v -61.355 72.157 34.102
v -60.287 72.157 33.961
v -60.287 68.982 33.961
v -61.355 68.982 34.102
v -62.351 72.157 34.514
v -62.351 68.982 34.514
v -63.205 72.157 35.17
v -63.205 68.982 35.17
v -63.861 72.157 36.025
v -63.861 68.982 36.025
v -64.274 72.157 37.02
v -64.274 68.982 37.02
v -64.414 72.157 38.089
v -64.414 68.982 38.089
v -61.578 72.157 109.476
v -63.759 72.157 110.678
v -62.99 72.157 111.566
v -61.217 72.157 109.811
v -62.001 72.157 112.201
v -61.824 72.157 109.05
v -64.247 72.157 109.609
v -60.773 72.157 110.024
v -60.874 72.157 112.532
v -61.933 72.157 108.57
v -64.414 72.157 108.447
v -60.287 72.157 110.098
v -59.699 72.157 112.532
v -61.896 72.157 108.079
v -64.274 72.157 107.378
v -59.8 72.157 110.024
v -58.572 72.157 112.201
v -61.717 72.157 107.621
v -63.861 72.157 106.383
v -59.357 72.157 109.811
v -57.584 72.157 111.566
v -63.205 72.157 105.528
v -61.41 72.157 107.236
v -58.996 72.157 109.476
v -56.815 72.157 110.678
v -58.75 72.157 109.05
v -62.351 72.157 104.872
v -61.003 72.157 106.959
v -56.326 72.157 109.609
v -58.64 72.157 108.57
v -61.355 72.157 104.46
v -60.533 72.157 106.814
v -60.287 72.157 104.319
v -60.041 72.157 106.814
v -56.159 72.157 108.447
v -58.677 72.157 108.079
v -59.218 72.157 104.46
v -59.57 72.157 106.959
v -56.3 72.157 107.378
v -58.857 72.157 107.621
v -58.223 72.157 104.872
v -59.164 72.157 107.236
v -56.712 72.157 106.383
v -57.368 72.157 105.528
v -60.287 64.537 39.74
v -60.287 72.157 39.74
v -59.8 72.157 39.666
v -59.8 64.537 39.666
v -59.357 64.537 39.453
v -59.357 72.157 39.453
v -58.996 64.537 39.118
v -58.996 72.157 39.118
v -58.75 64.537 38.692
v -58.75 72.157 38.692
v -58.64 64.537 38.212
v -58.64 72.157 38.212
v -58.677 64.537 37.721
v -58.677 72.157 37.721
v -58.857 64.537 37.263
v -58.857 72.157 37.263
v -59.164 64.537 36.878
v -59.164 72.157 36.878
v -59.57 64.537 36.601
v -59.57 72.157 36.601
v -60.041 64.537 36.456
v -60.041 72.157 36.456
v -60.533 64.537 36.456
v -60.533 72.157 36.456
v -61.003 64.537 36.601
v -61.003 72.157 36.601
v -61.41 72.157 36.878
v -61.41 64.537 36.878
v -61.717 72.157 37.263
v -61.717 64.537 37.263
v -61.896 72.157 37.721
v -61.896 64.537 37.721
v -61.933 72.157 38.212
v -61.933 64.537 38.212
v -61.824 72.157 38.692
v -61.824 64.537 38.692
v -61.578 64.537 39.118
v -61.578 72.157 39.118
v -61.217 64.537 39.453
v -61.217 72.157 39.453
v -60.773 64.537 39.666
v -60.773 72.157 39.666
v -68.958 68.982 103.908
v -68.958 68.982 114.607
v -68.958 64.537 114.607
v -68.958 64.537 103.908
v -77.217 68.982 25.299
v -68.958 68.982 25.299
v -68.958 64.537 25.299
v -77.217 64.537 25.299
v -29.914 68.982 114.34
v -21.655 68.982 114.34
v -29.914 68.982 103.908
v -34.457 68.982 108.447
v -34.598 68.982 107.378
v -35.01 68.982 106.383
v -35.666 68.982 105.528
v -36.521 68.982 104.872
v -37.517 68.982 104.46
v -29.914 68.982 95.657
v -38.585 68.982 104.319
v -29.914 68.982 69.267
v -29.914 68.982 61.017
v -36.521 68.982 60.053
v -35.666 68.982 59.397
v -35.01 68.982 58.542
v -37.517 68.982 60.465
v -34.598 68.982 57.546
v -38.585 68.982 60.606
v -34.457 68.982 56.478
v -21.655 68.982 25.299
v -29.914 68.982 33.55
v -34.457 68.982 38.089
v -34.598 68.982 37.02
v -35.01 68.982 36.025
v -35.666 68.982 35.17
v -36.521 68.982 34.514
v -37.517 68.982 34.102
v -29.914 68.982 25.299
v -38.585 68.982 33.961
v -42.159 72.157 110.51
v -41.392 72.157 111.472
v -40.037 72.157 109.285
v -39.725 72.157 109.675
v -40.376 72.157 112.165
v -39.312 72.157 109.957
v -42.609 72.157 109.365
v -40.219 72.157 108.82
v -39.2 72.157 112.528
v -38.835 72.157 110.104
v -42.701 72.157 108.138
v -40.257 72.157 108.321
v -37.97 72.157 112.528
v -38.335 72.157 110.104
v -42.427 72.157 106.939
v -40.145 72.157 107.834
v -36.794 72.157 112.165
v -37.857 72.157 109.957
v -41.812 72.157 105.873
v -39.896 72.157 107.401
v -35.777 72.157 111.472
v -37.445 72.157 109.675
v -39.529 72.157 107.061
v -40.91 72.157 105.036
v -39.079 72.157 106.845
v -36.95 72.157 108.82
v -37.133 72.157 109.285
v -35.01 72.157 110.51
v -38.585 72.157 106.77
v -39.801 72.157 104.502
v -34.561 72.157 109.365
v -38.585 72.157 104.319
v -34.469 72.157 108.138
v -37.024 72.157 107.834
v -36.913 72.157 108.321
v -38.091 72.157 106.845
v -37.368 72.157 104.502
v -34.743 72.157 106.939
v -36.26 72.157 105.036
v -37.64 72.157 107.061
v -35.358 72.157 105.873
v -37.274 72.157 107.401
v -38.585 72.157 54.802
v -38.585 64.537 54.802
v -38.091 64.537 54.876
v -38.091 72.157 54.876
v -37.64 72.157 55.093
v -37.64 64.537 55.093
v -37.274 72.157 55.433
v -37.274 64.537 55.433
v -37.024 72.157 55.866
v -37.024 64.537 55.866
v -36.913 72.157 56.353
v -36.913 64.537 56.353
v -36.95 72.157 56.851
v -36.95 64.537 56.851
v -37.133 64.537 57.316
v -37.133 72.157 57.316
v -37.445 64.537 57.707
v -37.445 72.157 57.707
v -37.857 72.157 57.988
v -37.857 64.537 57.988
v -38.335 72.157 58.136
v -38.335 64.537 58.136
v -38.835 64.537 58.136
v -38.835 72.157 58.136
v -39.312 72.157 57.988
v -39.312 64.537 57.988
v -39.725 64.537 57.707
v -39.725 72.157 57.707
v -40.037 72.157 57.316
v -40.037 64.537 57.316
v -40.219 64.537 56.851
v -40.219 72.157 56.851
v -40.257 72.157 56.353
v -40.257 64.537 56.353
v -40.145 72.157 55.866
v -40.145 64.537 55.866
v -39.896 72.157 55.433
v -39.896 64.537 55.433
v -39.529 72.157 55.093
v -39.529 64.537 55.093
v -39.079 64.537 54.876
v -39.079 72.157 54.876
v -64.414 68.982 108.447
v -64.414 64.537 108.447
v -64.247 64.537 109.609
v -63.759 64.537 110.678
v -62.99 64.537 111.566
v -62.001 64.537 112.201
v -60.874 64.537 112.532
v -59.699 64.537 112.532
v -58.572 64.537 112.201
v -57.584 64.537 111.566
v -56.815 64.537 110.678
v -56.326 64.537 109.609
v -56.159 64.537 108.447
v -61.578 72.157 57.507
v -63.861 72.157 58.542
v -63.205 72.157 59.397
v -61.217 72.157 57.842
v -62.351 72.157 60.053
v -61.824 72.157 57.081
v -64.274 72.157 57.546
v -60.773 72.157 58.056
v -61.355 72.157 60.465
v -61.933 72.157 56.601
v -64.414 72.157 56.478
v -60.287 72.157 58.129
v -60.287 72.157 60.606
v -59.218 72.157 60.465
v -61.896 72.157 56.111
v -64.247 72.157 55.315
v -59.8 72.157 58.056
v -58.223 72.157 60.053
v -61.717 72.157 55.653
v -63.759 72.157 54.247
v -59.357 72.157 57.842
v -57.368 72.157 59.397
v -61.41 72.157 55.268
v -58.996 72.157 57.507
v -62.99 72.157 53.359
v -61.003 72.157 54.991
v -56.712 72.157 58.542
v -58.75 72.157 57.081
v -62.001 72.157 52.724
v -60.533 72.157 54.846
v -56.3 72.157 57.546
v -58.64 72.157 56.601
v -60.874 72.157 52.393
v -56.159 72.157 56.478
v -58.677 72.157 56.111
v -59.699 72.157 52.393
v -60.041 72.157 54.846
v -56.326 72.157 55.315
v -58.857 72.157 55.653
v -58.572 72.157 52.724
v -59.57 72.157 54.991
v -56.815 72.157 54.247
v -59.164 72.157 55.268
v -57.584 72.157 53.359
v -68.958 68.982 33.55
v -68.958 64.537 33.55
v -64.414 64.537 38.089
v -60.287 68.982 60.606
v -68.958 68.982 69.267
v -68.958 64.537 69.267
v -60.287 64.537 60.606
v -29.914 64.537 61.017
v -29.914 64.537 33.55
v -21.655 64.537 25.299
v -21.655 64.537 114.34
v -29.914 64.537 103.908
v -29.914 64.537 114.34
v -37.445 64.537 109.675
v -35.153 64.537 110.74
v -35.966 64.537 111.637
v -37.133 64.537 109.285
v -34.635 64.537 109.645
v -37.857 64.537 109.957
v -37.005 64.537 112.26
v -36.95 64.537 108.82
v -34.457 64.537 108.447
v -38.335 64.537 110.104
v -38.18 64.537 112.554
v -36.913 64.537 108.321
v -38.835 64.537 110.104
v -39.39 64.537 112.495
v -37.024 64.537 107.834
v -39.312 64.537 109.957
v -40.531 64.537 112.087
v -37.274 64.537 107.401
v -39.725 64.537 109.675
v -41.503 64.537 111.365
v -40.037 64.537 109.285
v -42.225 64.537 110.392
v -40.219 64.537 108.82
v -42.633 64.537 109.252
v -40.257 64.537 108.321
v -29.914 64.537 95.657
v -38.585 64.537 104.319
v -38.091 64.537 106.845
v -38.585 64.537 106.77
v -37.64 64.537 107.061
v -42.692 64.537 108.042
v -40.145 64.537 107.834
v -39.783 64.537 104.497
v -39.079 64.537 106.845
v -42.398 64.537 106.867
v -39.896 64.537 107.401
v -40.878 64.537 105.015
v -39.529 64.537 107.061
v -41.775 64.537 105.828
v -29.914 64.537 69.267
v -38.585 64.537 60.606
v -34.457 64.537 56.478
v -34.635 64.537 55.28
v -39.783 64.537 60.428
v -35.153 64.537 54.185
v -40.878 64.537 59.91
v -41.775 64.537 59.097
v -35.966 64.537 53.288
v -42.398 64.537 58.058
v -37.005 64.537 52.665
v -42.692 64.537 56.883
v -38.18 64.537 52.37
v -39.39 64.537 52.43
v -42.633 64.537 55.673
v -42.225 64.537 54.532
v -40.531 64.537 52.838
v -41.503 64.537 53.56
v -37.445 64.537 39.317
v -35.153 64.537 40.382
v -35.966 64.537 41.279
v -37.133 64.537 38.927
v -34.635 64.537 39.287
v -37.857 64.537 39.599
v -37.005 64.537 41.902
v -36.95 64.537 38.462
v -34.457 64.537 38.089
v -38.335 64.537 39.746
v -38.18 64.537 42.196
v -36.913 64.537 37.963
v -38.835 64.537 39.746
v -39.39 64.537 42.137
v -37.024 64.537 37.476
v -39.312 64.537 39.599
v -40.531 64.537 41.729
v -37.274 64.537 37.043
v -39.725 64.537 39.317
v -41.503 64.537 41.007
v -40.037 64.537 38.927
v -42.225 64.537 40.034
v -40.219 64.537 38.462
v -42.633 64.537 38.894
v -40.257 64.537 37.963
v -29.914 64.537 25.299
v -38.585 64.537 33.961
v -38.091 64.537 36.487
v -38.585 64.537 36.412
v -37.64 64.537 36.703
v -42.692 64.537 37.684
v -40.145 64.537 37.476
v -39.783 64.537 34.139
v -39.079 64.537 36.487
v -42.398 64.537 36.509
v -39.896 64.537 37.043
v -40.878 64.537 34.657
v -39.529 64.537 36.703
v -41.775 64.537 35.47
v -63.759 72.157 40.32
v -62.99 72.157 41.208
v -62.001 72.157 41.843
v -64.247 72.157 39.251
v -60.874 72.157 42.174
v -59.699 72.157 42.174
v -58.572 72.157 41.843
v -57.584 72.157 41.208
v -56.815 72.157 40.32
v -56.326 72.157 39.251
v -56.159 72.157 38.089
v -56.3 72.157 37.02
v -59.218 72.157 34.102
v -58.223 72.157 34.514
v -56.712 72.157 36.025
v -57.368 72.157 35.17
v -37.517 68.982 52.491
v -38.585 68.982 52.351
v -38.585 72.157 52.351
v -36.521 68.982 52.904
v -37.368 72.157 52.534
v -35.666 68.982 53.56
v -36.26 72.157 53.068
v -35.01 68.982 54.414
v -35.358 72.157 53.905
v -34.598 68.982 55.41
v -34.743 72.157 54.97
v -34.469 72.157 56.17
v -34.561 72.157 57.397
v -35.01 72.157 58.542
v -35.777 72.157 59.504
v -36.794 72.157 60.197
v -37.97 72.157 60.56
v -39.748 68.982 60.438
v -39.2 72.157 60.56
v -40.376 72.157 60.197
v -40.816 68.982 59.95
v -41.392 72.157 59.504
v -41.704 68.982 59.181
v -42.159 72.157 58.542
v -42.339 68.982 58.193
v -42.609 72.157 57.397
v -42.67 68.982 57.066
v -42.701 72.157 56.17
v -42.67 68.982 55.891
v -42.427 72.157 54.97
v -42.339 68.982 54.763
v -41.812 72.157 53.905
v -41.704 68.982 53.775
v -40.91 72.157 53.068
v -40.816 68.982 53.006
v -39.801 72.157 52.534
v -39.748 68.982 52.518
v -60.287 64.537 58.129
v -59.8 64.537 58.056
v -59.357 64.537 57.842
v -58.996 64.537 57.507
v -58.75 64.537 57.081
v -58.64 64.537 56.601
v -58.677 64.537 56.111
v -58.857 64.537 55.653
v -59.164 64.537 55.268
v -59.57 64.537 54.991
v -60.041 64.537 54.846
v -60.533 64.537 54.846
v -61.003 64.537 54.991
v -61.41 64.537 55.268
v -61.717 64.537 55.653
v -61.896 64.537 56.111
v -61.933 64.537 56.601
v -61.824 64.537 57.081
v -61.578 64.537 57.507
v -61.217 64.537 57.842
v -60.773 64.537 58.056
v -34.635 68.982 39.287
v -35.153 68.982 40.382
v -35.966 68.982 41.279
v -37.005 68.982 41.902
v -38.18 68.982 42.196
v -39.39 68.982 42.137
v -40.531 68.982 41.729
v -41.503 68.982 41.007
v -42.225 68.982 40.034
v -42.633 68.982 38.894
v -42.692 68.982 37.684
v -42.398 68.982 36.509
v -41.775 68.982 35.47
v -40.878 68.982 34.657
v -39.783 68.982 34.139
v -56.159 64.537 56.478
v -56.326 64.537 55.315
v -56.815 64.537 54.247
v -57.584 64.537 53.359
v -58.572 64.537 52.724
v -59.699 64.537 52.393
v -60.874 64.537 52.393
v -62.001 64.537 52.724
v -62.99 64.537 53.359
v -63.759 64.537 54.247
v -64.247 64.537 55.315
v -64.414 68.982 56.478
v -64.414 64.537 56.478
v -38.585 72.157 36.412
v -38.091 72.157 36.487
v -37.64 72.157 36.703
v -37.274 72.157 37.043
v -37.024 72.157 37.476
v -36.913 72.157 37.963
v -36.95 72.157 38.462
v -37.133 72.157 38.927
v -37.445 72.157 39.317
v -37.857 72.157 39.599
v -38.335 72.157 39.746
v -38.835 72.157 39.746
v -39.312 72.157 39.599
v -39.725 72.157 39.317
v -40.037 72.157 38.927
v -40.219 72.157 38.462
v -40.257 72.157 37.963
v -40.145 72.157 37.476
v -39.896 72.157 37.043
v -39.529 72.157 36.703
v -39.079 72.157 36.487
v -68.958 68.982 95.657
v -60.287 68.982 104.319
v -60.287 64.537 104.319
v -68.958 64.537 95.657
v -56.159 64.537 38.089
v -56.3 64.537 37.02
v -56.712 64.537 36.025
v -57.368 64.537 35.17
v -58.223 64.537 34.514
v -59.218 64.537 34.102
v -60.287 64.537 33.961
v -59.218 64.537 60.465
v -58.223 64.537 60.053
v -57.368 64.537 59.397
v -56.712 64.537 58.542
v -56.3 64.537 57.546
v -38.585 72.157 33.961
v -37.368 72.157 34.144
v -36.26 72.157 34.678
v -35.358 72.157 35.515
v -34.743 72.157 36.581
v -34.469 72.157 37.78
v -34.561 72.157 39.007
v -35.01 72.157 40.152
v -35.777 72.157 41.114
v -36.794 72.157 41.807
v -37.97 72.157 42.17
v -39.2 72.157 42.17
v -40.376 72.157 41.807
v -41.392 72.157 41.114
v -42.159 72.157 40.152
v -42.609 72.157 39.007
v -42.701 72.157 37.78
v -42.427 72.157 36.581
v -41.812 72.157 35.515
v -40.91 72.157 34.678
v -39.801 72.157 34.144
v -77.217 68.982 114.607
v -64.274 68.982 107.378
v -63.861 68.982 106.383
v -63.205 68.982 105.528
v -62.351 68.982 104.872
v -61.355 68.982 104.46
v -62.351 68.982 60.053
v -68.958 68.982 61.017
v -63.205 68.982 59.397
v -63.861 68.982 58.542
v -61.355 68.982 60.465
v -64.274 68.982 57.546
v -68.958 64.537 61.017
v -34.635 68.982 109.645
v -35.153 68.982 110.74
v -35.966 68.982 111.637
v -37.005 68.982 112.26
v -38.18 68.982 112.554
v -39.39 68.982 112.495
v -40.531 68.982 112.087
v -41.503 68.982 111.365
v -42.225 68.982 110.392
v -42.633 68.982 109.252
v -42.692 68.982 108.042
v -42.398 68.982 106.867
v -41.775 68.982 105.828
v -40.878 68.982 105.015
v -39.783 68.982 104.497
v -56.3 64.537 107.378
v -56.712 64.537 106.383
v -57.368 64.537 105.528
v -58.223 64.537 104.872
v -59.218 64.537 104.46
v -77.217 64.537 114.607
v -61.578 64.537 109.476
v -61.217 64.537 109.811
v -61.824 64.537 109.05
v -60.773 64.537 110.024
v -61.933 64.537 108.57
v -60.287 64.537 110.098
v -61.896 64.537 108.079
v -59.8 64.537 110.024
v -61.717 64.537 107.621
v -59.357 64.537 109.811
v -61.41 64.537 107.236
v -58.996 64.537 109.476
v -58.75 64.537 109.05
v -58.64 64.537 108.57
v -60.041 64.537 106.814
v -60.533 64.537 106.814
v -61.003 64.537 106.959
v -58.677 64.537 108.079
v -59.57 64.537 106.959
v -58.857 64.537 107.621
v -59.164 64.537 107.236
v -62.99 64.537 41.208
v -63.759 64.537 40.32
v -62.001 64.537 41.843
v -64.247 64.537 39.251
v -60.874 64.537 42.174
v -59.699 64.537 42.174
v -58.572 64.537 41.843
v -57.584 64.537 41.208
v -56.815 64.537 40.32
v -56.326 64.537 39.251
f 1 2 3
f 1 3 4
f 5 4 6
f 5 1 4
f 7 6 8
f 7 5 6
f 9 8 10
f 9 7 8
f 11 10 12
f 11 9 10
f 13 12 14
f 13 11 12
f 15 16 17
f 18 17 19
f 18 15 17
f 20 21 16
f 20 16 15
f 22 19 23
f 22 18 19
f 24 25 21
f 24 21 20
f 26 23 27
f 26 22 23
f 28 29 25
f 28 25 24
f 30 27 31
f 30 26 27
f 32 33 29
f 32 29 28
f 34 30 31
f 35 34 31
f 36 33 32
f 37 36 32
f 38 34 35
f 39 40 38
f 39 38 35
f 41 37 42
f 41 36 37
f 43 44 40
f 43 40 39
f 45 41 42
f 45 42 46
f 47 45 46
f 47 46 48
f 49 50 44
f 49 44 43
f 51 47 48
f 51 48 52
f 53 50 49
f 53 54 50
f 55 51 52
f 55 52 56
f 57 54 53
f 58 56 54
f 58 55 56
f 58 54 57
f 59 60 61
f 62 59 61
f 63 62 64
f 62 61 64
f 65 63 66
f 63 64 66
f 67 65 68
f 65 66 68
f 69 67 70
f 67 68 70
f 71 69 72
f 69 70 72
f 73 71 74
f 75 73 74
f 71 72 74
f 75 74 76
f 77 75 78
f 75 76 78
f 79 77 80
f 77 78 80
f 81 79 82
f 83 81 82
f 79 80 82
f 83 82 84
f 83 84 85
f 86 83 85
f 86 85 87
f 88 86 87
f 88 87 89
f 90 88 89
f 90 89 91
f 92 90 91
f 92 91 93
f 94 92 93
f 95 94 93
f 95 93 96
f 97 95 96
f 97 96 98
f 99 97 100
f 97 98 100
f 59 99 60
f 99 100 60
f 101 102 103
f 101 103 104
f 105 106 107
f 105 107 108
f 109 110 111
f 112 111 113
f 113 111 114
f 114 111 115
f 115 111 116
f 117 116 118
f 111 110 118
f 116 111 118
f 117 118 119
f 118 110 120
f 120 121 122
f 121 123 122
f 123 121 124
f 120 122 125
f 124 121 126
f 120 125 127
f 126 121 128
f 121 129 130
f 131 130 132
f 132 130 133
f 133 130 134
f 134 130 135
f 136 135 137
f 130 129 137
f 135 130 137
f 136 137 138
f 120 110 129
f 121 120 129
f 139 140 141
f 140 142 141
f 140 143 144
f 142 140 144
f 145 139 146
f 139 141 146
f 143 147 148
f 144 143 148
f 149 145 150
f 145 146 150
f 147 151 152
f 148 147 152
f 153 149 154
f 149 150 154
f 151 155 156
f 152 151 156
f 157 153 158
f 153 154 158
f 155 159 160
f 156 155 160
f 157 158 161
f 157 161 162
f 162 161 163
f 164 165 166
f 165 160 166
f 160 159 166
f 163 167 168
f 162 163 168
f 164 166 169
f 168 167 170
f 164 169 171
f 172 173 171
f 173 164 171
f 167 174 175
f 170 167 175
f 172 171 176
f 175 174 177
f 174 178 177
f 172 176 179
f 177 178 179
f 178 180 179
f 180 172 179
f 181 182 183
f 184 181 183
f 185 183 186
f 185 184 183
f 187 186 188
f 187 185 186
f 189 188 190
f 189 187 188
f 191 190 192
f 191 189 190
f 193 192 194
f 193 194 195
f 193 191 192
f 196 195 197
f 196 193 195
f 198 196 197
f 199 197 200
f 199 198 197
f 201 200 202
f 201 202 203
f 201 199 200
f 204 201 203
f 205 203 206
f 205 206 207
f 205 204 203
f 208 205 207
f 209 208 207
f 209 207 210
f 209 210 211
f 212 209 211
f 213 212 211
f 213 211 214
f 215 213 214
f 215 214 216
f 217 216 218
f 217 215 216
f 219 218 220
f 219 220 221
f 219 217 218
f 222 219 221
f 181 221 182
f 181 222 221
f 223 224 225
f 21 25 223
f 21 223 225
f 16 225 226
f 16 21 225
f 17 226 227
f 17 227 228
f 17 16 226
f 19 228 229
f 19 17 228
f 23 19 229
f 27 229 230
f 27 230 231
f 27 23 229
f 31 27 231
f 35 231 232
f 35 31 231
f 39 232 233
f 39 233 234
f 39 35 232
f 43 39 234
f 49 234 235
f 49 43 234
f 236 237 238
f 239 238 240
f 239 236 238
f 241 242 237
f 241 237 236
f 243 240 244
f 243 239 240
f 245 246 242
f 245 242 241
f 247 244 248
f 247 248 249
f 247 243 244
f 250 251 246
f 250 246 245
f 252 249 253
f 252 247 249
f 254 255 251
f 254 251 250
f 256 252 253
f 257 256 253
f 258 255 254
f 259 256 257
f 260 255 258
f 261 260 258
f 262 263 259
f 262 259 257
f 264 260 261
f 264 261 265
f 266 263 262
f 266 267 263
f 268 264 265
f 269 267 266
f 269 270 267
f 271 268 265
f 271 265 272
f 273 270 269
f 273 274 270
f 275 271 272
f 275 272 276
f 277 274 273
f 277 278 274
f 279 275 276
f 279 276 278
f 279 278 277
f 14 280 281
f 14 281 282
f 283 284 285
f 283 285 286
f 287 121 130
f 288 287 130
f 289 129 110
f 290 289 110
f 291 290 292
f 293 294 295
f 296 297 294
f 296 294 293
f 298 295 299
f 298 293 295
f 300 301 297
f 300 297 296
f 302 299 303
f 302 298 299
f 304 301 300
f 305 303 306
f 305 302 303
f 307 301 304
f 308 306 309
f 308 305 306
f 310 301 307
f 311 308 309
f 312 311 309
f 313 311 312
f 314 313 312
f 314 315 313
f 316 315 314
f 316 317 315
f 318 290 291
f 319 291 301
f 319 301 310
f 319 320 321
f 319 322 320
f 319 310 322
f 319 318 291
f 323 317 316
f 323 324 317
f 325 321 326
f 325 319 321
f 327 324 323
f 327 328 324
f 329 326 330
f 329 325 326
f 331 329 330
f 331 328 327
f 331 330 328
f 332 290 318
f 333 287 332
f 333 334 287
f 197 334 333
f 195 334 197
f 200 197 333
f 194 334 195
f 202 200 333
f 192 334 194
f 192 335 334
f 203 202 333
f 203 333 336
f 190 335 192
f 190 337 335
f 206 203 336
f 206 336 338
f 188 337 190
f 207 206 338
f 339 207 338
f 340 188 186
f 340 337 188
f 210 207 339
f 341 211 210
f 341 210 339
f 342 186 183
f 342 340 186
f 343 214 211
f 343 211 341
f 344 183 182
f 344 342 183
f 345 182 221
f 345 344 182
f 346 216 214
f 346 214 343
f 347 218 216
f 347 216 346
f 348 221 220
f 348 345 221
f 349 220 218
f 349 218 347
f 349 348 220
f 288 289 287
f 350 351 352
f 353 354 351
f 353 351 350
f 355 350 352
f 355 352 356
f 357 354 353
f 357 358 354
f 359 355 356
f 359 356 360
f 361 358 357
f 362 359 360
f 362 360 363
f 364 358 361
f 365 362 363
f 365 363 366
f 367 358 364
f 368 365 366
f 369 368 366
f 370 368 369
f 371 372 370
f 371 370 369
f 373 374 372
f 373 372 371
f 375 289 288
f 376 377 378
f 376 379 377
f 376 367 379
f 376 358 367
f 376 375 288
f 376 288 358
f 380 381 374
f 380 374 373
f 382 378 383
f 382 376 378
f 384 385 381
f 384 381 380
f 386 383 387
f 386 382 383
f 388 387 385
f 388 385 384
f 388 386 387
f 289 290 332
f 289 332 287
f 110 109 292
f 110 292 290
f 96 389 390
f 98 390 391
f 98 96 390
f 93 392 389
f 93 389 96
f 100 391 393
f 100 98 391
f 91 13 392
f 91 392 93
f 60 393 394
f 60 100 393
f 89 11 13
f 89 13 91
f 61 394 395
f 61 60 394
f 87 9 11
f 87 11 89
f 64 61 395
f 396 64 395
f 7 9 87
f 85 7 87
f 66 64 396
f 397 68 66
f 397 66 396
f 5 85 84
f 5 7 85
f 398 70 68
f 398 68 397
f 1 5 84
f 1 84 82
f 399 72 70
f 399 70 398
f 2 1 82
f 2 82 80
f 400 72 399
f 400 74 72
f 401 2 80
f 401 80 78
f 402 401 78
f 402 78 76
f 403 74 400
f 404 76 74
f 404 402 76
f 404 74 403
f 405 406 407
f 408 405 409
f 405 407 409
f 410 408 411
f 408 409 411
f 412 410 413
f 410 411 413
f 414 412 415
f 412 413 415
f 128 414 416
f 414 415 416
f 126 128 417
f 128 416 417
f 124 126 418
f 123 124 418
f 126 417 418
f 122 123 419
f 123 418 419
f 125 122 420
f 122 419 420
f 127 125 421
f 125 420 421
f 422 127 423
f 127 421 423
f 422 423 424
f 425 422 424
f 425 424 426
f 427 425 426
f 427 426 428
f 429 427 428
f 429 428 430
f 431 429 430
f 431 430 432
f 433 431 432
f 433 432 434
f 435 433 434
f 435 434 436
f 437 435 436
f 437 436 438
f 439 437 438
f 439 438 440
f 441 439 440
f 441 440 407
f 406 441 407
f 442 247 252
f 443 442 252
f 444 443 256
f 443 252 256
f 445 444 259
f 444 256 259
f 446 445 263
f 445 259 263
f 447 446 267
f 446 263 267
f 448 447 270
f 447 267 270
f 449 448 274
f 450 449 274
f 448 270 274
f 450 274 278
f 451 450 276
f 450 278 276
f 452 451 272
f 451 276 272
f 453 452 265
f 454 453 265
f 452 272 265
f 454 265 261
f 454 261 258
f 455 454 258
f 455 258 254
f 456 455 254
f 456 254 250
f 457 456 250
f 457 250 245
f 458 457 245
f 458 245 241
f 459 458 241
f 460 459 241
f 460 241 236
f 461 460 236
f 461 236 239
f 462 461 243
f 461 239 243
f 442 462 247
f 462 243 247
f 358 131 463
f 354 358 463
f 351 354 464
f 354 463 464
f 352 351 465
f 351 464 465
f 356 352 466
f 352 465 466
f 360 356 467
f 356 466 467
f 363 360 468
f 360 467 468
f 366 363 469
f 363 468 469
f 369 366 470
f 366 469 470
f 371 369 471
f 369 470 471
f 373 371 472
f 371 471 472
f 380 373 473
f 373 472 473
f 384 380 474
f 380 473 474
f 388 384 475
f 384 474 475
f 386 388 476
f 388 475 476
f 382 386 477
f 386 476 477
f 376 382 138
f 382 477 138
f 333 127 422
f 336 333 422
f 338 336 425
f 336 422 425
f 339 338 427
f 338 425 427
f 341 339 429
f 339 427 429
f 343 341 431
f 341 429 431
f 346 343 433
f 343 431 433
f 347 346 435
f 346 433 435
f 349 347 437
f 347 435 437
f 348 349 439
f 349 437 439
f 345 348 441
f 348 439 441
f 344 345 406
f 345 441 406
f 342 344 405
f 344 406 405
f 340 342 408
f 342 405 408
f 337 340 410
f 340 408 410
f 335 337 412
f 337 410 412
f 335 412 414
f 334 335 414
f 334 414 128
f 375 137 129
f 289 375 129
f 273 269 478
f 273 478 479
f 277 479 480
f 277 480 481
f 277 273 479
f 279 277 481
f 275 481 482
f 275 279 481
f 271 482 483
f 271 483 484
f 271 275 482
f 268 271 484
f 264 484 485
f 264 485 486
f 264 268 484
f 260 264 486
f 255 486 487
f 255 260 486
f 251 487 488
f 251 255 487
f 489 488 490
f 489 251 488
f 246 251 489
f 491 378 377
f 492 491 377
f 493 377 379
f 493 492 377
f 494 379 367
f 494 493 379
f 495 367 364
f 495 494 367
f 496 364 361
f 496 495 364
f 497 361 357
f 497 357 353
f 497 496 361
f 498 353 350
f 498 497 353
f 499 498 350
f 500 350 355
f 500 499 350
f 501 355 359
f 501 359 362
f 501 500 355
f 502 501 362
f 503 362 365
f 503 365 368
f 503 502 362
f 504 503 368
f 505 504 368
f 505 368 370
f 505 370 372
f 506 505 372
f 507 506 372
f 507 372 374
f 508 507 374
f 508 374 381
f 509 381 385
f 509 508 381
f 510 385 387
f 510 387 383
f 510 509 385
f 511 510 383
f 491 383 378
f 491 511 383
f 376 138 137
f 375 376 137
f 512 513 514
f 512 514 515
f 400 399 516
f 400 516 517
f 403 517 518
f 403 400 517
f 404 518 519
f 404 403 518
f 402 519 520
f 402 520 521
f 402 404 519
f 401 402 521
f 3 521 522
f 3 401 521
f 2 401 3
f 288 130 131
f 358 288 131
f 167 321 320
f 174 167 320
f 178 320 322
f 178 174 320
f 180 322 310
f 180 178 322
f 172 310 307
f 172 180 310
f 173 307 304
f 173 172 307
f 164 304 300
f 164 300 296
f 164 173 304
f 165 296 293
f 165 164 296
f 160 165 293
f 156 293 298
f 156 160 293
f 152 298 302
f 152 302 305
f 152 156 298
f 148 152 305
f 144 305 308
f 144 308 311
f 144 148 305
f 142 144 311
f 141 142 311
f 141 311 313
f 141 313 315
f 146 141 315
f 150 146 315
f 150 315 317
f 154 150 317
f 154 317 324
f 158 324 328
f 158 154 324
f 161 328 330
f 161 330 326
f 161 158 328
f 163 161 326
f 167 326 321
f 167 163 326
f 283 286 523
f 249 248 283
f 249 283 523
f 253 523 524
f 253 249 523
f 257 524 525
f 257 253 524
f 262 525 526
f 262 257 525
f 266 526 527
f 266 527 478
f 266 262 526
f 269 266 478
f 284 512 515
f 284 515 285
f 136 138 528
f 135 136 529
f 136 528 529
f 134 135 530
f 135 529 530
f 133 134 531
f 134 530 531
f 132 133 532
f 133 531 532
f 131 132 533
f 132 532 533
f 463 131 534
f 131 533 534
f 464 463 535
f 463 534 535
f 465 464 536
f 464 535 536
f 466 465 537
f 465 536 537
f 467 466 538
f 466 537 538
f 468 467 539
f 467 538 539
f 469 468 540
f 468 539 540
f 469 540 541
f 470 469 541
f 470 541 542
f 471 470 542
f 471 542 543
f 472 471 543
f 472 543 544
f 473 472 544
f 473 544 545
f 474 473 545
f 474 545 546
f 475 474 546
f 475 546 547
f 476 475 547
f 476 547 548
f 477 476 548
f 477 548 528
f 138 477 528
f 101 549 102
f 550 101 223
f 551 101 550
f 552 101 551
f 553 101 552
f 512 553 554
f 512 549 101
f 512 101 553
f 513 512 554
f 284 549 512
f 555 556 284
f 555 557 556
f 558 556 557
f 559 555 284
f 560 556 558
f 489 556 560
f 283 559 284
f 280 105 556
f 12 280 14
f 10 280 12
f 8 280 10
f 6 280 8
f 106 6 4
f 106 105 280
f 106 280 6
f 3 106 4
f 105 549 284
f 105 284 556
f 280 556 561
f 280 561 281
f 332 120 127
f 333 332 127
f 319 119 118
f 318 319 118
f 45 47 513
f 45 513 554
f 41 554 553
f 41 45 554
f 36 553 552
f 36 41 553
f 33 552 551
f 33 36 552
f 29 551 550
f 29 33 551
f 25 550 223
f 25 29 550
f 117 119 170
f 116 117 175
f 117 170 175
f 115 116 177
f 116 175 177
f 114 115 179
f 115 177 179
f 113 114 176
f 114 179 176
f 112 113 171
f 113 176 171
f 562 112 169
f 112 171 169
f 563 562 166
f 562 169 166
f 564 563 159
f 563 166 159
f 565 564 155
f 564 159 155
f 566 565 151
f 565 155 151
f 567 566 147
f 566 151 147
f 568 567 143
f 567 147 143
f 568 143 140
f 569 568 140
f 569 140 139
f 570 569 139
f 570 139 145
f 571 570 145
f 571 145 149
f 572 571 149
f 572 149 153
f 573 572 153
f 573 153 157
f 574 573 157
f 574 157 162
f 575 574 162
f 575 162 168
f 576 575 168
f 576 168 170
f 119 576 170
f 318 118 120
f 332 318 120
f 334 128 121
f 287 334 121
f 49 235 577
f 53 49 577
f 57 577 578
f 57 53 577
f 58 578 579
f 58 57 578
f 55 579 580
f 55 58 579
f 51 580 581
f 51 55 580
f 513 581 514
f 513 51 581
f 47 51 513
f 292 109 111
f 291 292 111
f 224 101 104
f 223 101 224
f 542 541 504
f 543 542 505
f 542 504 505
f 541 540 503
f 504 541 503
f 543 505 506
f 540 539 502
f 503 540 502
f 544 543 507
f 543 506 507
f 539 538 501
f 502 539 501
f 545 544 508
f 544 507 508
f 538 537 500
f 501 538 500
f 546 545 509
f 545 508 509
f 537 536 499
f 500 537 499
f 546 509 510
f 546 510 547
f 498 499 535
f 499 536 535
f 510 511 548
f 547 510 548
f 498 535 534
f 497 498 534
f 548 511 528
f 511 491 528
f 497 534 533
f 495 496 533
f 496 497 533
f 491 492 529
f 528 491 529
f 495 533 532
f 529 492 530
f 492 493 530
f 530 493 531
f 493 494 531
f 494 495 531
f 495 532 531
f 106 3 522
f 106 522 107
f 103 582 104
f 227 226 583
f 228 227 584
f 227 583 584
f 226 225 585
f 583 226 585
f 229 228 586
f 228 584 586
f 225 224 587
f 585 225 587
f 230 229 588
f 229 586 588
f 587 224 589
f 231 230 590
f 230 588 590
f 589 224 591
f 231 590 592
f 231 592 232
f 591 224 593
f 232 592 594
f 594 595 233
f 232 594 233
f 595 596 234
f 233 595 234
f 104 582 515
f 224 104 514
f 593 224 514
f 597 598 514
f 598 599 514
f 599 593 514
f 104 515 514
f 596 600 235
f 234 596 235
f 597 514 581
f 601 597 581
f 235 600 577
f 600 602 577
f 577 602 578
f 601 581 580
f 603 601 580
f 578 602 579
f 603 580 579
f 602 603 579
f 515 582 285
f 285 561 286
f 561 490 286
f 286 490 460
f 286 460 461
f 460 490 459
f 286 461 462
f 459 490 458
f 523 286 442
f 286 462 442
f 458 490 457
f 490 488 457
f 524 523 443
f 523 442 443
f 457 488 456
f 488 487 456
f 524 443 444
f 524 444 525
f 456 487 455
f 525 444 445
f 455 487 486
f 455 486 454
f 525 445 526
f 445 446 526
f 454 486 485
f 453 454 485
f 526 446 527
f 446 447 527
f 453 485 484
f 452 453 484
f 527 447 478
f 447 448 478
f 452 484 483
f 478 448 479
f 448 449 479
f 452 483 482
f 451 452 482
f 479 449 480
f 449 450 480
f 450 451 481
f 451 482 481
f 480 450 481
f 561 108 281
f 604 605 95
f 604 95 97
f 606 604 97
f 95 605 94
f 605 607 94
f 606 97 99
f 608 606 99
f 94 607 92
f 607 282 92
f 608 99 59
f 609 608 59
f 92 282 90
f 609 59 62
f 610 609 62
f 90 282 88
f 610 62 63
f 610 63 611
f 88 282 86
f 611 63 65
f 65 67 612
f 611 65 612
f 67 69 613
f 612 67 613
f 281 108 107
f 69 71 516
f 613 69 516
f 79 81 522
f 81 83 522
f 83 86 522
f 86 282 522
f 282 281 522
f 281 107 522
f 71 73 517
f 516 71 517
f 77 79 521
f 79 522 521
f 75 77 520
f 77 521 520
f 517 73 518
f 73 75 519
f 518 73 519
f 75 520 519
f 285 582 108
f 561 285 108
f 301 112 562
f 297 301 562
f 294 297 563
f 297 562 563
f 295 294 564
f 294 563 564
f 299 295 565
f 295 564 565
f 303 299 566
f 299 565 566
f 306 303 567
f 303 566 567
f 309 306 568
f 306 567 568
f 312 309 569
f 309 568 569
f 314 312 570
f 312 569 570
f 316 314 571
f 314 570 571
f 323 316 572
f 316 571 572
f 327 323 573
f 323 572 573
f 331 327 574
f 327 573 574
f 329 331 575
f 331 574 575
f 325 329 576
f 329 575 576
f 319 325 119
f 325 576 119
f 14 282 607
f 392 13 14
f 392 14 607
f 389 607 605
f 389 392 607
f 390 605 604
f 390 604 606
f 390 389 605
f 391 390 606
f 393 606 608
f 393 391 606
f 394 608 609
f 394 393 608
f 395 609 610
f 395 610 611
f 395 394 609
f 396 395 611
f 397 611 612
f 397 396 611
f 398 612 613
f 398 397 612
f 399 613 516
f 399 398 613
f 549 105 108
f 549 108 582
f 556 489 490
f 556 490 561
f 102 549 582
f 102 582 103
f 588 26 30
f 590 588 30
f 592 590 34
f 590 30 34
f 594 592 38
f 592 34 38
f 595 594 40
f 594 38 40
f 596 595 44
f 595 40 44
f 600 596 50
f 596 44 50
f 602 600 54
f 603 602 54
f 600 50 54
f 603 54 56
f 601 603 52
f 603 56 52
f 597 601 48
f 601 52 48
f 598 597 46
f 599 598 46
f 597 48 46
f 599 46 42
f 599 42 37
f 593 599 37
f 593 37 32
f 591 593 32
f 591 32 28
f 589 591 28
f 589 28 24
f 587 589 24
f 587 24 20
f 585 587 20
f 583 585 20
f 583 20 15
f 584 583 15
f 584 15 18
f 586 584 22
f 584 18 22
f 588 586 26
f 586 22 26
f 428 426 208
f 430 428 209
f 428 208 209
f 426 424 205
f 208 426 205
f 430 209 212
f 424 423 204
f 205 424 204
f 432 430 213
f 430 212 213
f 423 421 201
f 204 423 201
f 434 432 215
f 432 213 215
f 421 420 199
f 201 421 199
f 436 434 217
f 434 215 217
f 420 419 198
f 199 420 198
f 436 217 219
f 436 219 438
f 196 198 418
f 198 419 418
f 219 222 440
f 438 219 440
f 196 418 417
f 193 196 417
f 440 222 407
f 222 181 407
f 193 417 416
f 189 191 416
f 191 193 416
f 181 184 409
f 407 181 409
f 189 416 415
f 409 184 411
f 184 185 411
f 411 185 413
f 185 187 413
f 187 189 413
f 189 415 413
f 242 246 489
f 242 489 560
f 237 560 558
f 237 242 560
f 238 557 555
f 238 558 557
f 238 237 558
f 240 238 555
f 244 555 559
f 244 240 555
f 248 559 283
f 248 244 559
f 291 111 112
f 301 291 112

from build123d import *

# Parameters (mm, degrees)
SKETCH1_R              = 4.1275
SKETCH1_R_2            = 1.6764
BOSS_EXTRUDE1_DEPTH    = 3.175
BOSS_EXTRUDE1_2_DEPTH  = 3.175
BOSS_EXTRUDE1_3_DEPTH  = 3.175
BOSS_EXTRUDE1_4_DEPTH  = 3.175
BOSS_EXTRUDE1_5_DEPTH  = 3.175
BOSS_EXTRUDE1_6_DEPTH  = 3.175
BOSS_EXTRUDE1_7_DEPTH  = 3.175
BOSS_EXTRUDE1_8_DEPTH  = 3.175
BOSS_EXTRUDE1_9_DEPTH  = 3.175
BOSS_EXTRUDE1_10_DEPTH = 3.175
BOSS_EXTRUDE1_11_DEPTH = 3.175
BOSS_EXTRUDE1_12_DEPTH = 3.175
SKETCH2_R              = 1.6764
SKETCH2_R_2            = 1.597419346
BOSS_EXTRUDE2_DEPTH    = 4.445
SKETCH3_R              = 4.1275
SKETCH3_R_2            = 1.6764
BOSS_EXTRUDE3_DEPTH    = 6.35
SKETCH5_W              = 93.927077551
SKETCH5_H              = 52.017280011
CUT_EXTRUDE1_DEPTH     = 189.093566893
SKETCH6_W              = 99.512687727
SKETCH6_H              = 74.862867045
CUT_EXTRUDE3_DEPTH     = 189.006725097
SKETCH7_R              = 1.651
BOSS_EXTRUDE5_DEPTH    = 7.62
BOSS_EXTRUDE5_2_DEPTH  = 7.62
BOSS_EXTRUDE5_3_DEPTH  = 7.62
BOSS_EXTRUDE6_DEPTH    = 4.445
SKETCH10_W             = 53.220622609
SKETCH10_H             = 98.471007051
CUT_EXTRUDE4_DEPTH     = 139.402426653


with BuildPart() as part:
    # Sketch1 → Boss-Extrude1 (new body)
    with BuildSketch(Plane(origin=(0, 72.156669294, 0), x_dir=(-1, 0, 0), z_dir=(0, -1, 0))):
        with Locations(Location((-13.434351276, 13.879892008, 0), (0, 0, 90))):
            Circle(SKETCH1_R)
        with Locations(Location((-13.434351276, 13.879892008, 0), (0, 0, 90))):
            Circle(SKETCH1_R_2, mode=Mode.SUBTRACT)
    extrude(amount=BOSS_EXTRUDE1_DEPTH)



with BuildPart() as body_2:
    # Sketch1 → Boss-Extrude1 2 (new body)
    with BuildSketch(Plane(origin=(0, 72.156669294, 0), x_dir=(-1, 0, 0), z_dir=(0, -1, 0))):
        with Locations(Location((38.584848724, 13.879892008, 0), (0, 0, 90))):
            Circle(SKETCH1_R)
        with Locations(Location((38.584848724, 13.879892008, 0), (0, 0, 90))):
            Circle(SKETCH1_R_2, mode=Mode.SUBTRACT)
    extrude(amount=BOSS_EXTRUDE1_2_DEPTH)



with BuildPart() as body_3:
    # Sketch1 → Boss-Extrude1 3 (new body)
    with BuildSketch(Plane(origin=(0, 72.156669294, 0), x_dir=(-1, 0, 0), z_dir=(0, -1, 0))):
        with Locations(Location((-13.434351276, -38.088507992, 0), (0, 0, 90))):
            Circle(SKETCH1_R)
        with Locations(Location((-13.434351276, -38.088507992, 0), (0, 0, 90))):
            Circle(SKETCH1_R_2, mode=Mode.SUBTRACT)
    extrude(amount=BOSS_EXTRUDE1_3_DEPTH)


with BuildPart() as body_4:
    # Sketch1 → Boss-Extrude1 4 (new body)
    with BuildSketch(Plane(origin=(0, 72.156669294, 0), x_dir=(-1, 0, 0), z_dir=(0, -1, 0))):
        with Locations(Location((38.584848724, -38.088507992, 0), (0, 0, 90))):
            Circle(SKETCH1_R)
        with Locations(Location((38.584848724, -38.088507992, 0), (0, 0, 90))):
            Circle(SKETCH1_R_2, mode=Mode.SUBTRACT)
    extrude(amount=BOSS_EXTRUDE1_4_DEPTH)


with BuildPart() as body_5:
    # Sketch1 → Boss-Extrude1 5 (new body)
    with BuildSketch(Plane(origin=(0, 72.156669294, 0), x_dir=(-1, 0, 0), z_dir=(0, -1, 0))):
        with Locations(Location((-13.434351276, -56.478107992, 0), (0, 0, 90))):
            Circle(SKETCH1_R)
        with Locations(Location((-13.434351276, -56.478107992, 0), (0, 0, 90))):
            Circle(SKETCH1_R_2, mode=Mode.SUBTRACT)
    extrude(amount=BOSS_EXTRUDE1_5_DEPTH)


with BuildPart() as body_6:
    # Sketch1 → Boss-Extrude1 6 (new body)
    with BuildSketch(Plane(origin=(0, 72.156669294, 0), x_dir=(-1, 0, 0), z_dir=(0, -1, 0))):
        with Locations(Location((38.584848724, -56.478107992, 0), (0, 0, 90))):
            Circle(SKETCH1_R)
        with Locations(Location((38.584848724, -56.478107992, 0), (0, 0, 90))):
            Circle(SKETCH1_R_2, mode=Mode.SUBTRACT)
    extrude(amount=BOSS_EXTRUDE1_6_DEPTH)


with BuildPart() as body_7:
    # Sketch1 → Boss-Extrude1 7 (new body)
    with BuildSketch(Plane(origin=(0, 72.156669294, 0), x_dir=(-1, 0, 0), z_dir=(0, -1, 0))):
        with Locations(Location((-13.434351276, -108.446507992, 0), (0, 0, 90))):
            Circle(SKETCH1_R)
        with Locations(Location((-13.434351276, -108.446507992, 0), (0, 0, 90))):
            Circle(SKETCH1_R_2, mode=Mode.SUBTRACT)
    extrude(amount=BOSS_EXTRUDE1_7_DEPTH)


with BuildPart() as body_8:
    # Sketch1 → Boss-Extrude1 8 (new body)
    with BuildSketch(Plane(origin=(0, 72.156669294, 0), x_dir=(-1, 0, 0), z_dir=(0, -1, 0))):
        with Locations(Location((38.584848724, -108.446507992, 0), (0, 0, 90))):
            Circle(SKETCH1_R)
        with Locations(Location((38.584848724, -108.446507992, 0), (0, 0, 90))):
            Circle(SKETCH1_R_2, mode=Mode.SUBTRACT)
    extrude(amount=BOSS_EXTRUDE1_8_DEPTH)


with BuildPart() as body_9:
    # Sketch1 → Boss-Extrude1 9 (new body)
    with BuildSketch(Plane(origin=(0, 72.156669294, 0), x_dir=(-1, 0, 0), z_dir=(0, -1, 0))):
        with Locations(Location((-13.434351276, -126.836107992, 0), (0, 0, 90))):
            Circle(SKETCH1_R)
        with Locations(Location((-13.434351276, -126.836107992, 0), (0, 0, 90))):
            Circle(SKETCH1_R_2, mode=Mode.SUBTRACT)
    extrude(amount=BOSS_EXTRUDE1_9_DEPTH)


with BuildPart() as body_10:
    # Sketch1 → Boss-Extrude1 10 (new body)
    with BuildSketch(Plane(origin=(0, 72.156669294, 0), x_dir=(-1, 0, 0), z_dir=(0, -1, 0))):
        with Locations(Location((38.584848724, -126.836107992, 0), (0, 0, 90))):
            Circle(SKETCH1_R)
        with Locations(Location((38.584848724, -126.836107992, 0), (0, 0, 90))):
            Circle(SKETCH1_R_2, mode=Mode.SUBTRACT)
    extrude(amount=BOSS_EXTRUDE1_10_DEPTH)


with BuildPart() as body_11:
    # Sketch1 → Boss-Extrude1 11 (new body)
    with BuildSketch(Plane(origin=(0, 72.156669294, 0), x_dir=(-1, 0, 0), z_dir=(0, -1, 0))):
        with Locations(Location((-13.434351276, -178.804507992, 0), (0, 0, 90))):
            Circle(SKETCH1_R)
        with Locations(Location((-13.434351276, -178.804507992, 0), (0, 0, 90))):
            Circle(SKETCH1_R_2, mode=Mode.SUBTRACT)
    extrude(amount=BOSS_EXTRUDE1_11_DEPTH)


with BuildPart() as body_12:
    # Sketch1 → Boss-Extrude1 12 (new body)
    with BuildSketch(Plane(origin=(0, 72.156669294, 0), x_dir=(-1, 0, 0), z_dir=(0, -1, 0))):
        with Locations(Location((38.584848724, -178.804507992, 0), (0, 0, 90))):
            Circle(SKETCH1_R)
        with Locations(Location((38.584848724, -178.804507992, 0), (0, 0, 90))):
            Circle(SKETCH1_R_2, mode=Mode.SUBTRACT)
    extrude(amount=BOSS_EXTRUDE1_12_DEPTH)


with BuildPart() as body_2_1:
    add(body_2.part)

    add(body_3.part)  # Boss-Extrude2 merges body 3

    add(body_4.part)  # Boss-Extrude2 merges body 4

    add(body_5.part)  # Boss-Extrude2 merges body 5

    add(body_6.part)  # Boss-Extrude2 merges body 6

    add(body_7.part)  # Boss-Extrude2 merges body 7

    add(body_8.part)  # Boss-Extrude2 merges body 8

    add(body_9.part)  # Boss-Extrude2 merges body 9

    add(body_10.part)  # Boss-Extrude2 merges body 10

    add(body_11.part)  # Boss-Extrude2 merges body 11

    add(body_12.part)  # Boss-Extrude2 merges body 12
    # Sketch2 → Boss-Extrude2 (add)
    with BuildSketch(Plane(origin=(0, 68.981669294, 0), x_dir=(-1, 0, 0), z_dir=(0, -1, 0))):
        with BuildLine():
            Line((38.584848724, -174.677007992), (29.913944503, -166.01530123))
            Line((29.913944503, -166.01530123), (29.913944503, -139.625314754))
            Line((29.913944503, -139.625314754), (38.584848724, -130.963607992))
            ThreePointArc((38.584848724, -130.963607992), (41.503431963, -123.917524753), (34.457348724, -126.836107992))
            Line((34.457348724, -126.836107992), (29.913944503, -131.374692903))
            Line((29.913944503, -131.374692903), (29.913944503, -103.907923081))
            Line((29.913944503, -103.907923081), (34.457348724, -108.446507992))
            ThreePointArc((34.457348724, -108.446507992), (41.503431963, -111.365091232), (38.584848724, -104.319007992))
            Line((38.584848724, -104.319007992), (29.913944503, -95.65730123))
            Line((29.913944503, -95.65730123), (29.913944503, -69.267314754))
            Line((29.913944503, -69.267314754), (38.584848724, -60.605607992))
            ThreePointArc((38.584848724, -60.605607992), (41.503431963, -53.559524753), (34.457348724, -56.478107992))
            Line((34.457348724, -56.478107992), (29.913944503, -61.016692903))
            Line((29.913944503, -61.016692903), (29.913944503, -33.549923081))
            Line((29.913944503, -33.549923081), (34.457348724, -38.088507992))
            ThreePointArc((34.457348724, -38.088507992), (41.503431963, -41.007091232), (38.584848724, -33.961007992))
            Line((38.584848724, -33.961007992), (29.913944503, -25.29930123))
            Line((29.913944503, -25.29930123), (29.913944503, 1.090685246))
            Line((29.913944503, 1.090685246), (38.584848724, 9.752392008))
            ThreePointArc((38.584848724, 9.752392008), (41.503431963, 16.798475247), (34.457348724, 13.879892008))
            Line((34.457348724, 13.879892008), (12.575248724, -7.978997067))
            Line((12.575248724, -7.978997067), (-9.306851276, 13.879892008))
            ThreePointArc((-9.306851276, 13.879892008), (-10.515768037, 10.961308768), (-13.434351276, 9.752392008))
            Line((-13.434351276, 9.752392008), (-4.763447055, 1.090685246))
            Line((-4.763447055, 1.090685246), (-4.763447055, -25.29930123))
            Line((-4.763447055, -25.29930123), (-13.434351276, -33.961007992))
            ThreePointArc((-13.434351276, -33.961007992), (-16.352934515, -41.007091232), (-9.306851276, -38.088507992))
            Line((-9.306851276, -38.088507992), (-4.763447055, -33.549923081))
            Line((-4.763447055, -33.549923081), (-4.763447055, -61.016692903))
            Line((-4.763447055, -61.016692903), (-9.306851276, -56.478107992))
            ThreePointArc((-9.306851276, -56.478107992), (-16.352934515, -53.559524753), (-13.434351276, -60.605607992))
            Line((-13.434351276, -60.605607992), (-4.763447055, -69.267314754))
            Line((-4.763447055, -69.267314754), (-4.763447055, -95.65730123))
            Line((-4.763447055, -95.65730123), (-13.434351276, -104.319007992))
            ThreePointArc((-13.434351276, -104.319007992), (-16.352934515, -111.365091232), (-9.306851276, -108.446507992))
            Line((-9.306851276, -108.446507992), (-4.763447055, -103.907923081))
            Line((-4.763447055, -103.907923081), (-4.763447055, -131.374692903))
            Line((-4.763447055, -131.374692903), (-9.306851276, -126.836107992))
            ThreePointArc((-9.306851276, -126.836107992), (-16.352934515, -123.917524753), (-13.434351276, -130.963607992))
            Line((-13.434351276, -130.963607992), (-4.763447055, -139.625314754))
            Line((-4.763447055, -139.625314754), (-4.763447055, -166.01530123))
            Line((-4.763447055, -166.01530123), (-13.434351276, -174.677007992))
            ThreePointArc((-13.434351276, -174.677007992), (-16.352934515, -181.723091232), (-9.306851276, -178.804507992))
            Line((-9.306851276, -178.804507992), (12.575248724, -156.945618918))
            Line((12.575248724, -156.945618918), (34.457348724, -178.804507992))
            ThreePointArc((34.457348724, -178.804507992), (41.503431963, -181.723091232), (38.584848724, -174.677007992))
        make_face()
        with Locations(Location((-13.434351276, -178.804507992, 0), (0, 0, 90))):
            Circle(SKETCH2_R, mode=Mode.SUBTRACT)
        Polygon((8.445557325, -152.820307992), (3.495935743, -157.764679379), (3.495935743, -147.875936605), align=None, mode=Mode.SUBTRACT)
        with Locations(Location((-13.434351276, -126.836107992, 0), (0, 0, 90))):
            Circle(SKETCH2_R, mode=Mode.SUBTRACT)
        Polygon((16.704940123, -152.820307992), (21.654561705, -147.875936605), (21.654561705, -157.764679379), align=None, mode=Mode.SUBTRACT)
        with Locations(Location((38.584848724, -178.804507992, 0), (0, 0, 90))):
            Circle(SKETCH2_R, mode=Mode.SUBTRACT)
        with Locations(Location((38.584848724, -126.836107992, 0), (0, 0, 90))):
            Circle(SKETCH2_R, mode=Mode.SUBTRACT)
        with Locations(Location((38.584848724, -108.446507992, 0), (0, 0, 90))):
            Circle(SKETCH2_R, mode=Mode.SUBTRACT)
        with Locations(Location((-13.434351276, -56.478107992, 0), (0, 0, 90))):
            Circle(SKETCH2_R, mode=Mode.SUBTRACT)
        with Locations(Location((-13.434351276, -38.088507992, 0), (0, 0, 90))):
            Circle(SKETCH2_R, mode=Mode.SUBTRACT)
        Polygon((8.445557325, -12.104307992), (3.495935743, -17.048679379), (3.495935743, -7.159936605), align=None, mode=Mode.SUBTRACT)
        Polygon((3.495935743, -25.29930123), (12.575248724, -16.229618918), (21.654561705, -25.29930123), (21.654561705, -139.625314754), (12.575248724, -148.694997067), (3.495935743, -139.625314754), align=None, mode=Mode.SUBTRACT)
        with Locations(Location((38.584848724, -56.478107992, 0), (0, 0, 90))):
            Circle(SKETCH2_R, mode=Mode.SUBTRACT)
        with Locations(Location((38.584848724, -38.088507992, 0), (0, 0, 90))):
            Circle(SKETCH2_R, mode=Mode.SUBTRACT)
        Polygon((16.704940123, -12.104307992), (21.654561705, -7.159936605), (21.654561705, -17.048679379), align=None, mode=Mode.SUBTRACT)
        with Locations(Location((38.584848724, 13.879892008, 0), (0, 0, 90))):
            Circle(SKETCH2_R, mode=Mode.SUBTRACT)
        with Locations(Location((-13.434351276, -108.446507992, 0), (0, 0, 90))):
            Circle(SKETCH2_R_2, mode=Mode.SUBTRACT)
    extrude(amount=BOSS_EXTRUDE2_DEPTH)


with BuildPart() as part_1:
    add(part.part)

    add(body_2_1.part)  # Boss-Extrude3 merges body 2
    # Sketch3 → Boss-Extrude3 (add)
    with BuildSketch(Plane(origin=(0, 68.981669294, 0), x_dir=(-1, 0, 0), z_dir=(0, -1, 0))):
        with Locations(Location((-13.434351276, 13.879892008, 0), (0, 0, 90))):
            Circle(SKETCH3_R)
        with Locations(Location((-13.434351276, 13.879892008, 0), (0, 0, 90))):
            Circle(SKETCH3_R_2, mode=Mode.SUBTRACT)
    extrude(amount=BOSS_EXTRUDE3_DEPTH)

    # Sketch5 → Cut-Extrude1 (cut, through all)
    with BuildSketch(Plane(origin=(0, 72.156669294, 0), x_dir=(1, 0, 0), z_dir=(0, 1, 0))):
        with Locations((-6.446929607, 0.709338776)):
            Rectangle(SKETCH5_W, SKETCH5_H)
    extrude(amount=-CUT_EXTRUDE1_DEPTH, mode=Mode.SUBTRACT)

    # Sketch6 → Cut-Extrude3 (cut, through all)
    with BuildSketch(Plane(origin=(0, 72.156669294, 0), x_dir=(1, 0, 0), z_dir=(0, 1, 0))):
        with Locations((-14.039878686, -151.771582362)):
            Rectangle(SKETCH6_W, SKETCH6_H)
    extrude(amount=-CUT_EXTRUDE3_DEPTH, mode=Mode.SUBTRACT)


with BuildPart() as cut_extrude3_piece_1:
    # of the separate pieces the step leaves, piece 1, a body of its own (cut_extrude3_pieces)
    add(part_1.part.solids().sort_by_distance((9.306851276, 68.981669294, 108.446507992))[0])

    # Sketch10 → Cut-Extrude4 (cut, through all)
    with BuildSketch(Plane(origin=(0, 72.156669294, 0), x_dir=(1, 0, 0), z_dir=(0, 1, 0))):
        with Locations((18.323865827, -71.297393094)):
            Rectangle(SKETCH10_W, SKETCH10_H)
    extrude(amount=-CUT_EXTRUDE4_DEPTH, mode=Mode.SUBTRACT)


with BuildPart() as cut_extrude3_piece_2:
    # of the separate pieces the step leaves, piece 2, a body of its own (cut_extrude3_pieces)
    add(part_1.part.solids().sort_by_distance((-21.654561705, 68.981669294, 25.29930123))[0])


with BuildPart() as body_3_2:
    # Sketch7 → Boss-Extrude5 (new body)
    with BuildSketch(Plane(origin=(0, 72.156669294, 0), x_dir=(1, 0, 0), z_dir=(0, 1, 0))):
        with BuildLine():
            ThreePointArc((-56.159274687, -38.088507992), (-57.368191447, -35.169924753), (-60.286774687, -33.961007992))
            ThreePointArc((-60.286774687, -33.961007992), (-63.205357926, -35.169924753), (-64.414274687, -38.088507992))
            ThreePointArc((-64.414274687, -38.088507992), (-60.286774687, -42.216007992), (-56.159274687, -38.088507992))
        make_face()
        with Locations(Location((-60.286774687, -38.088507992, 0), (0, 0, 270))):
            Circle(SKETCH7_R, mode=Mode.SUBTRACT)
    extrude(amount=-BOSS_EXTRUDE5_DEPTH)



with BuildPart() as body_4_2:
    # Sketch7 → Boss-Extrude5 2 (new body)
    with BuildSketch(Plane(origin=(0, 72.156669294, 0), x_dir=(1, 0, 0), z_dir=(0, 1, 0))):
        with BuildLine():
            ThreePointArc((-56.159274687, -56.478107992), (-60.286774687, -52.350607992), (-64.414274687, -56.478107992))
            ThreePointArc((-64.414274687, -56.478107992), (-63.205357926, -59.396691232), (-60.286774687, -60.605607992))
            ThreePointArc((-60.286774687, -60.605607992), (-57.368191447, -59.396691232), (-56.159274687, -56.478107992))
        make_face()
        with Locations(Location((-60.286774687, -56.478107992, 0), (0, 0, 270))):
            Circle(SKETCH7_R, mode=Mode.SUBTRACT)
    extrude(amount=-BOSS_EXTRUDE5_2_DEPTH)


with BuildPart() as body_5_2:
    # Sketch7 → Boss-Extrude5 3 (new body)
    with BuildSketch(Plane(origin=(0, 72.156669294, 0), x_dir=(1, 0, 0), z_dir=(0, 1, 0))):
        with BuildLine():
            ThreePointArc((-60.286774687, -104.319007992), (-63.205357926, -105.527924753), (-64.414274687, -108.446507992))
            ThreePointArc((-64.414274687, -108.446507992), (-60.286774687, -112.574007992), (-56.159274687, -108.446507992))
            ThreePointArc((-56.159274687, -108.446507992), (-57.368191447, -105.527924753), (-60.286774687, -104.319007992))
        make_face()
        with Locations(Location((-60.286774687, -108.446507992, 0), (0, 0, 270))):
            Circle(SKETCH7_R, mode=Mode.SUBTRACT)
    extrude(amount=-BOSS_EXTRUDE5_3_DEPTH)


with BuildPart() as body_3_2_1:
    add(body_3_2.part)

    add(body_4_2.part)  # Boss-Extrude6 merges body 4 2

    add(body_5_2.part)  # Boss-Extrude6 merges body 5 2
    # Sketch9 → Boss-Extrude6 (add)
    with BuildSketch(Plane(origin=(0, 68.981669294, 0), x_dir=(1, 0, 0), z_dir=(0, 1, 0))):
        with BuildLine():
            Line((-68.957678907, -25.29930123), (-77.217061705, -25.29930123))
            Line((-77.217061705, -25.29930123), (-77.217061705, -114.606686913))
            Line((-77.217061705, -114.606686913), (-68.957678907, -114.606686913))
            Line((-68.957678907, -114.606686913), (-68.957678907, -103.907923081))
            Line((-68.957678907, -103.907923081), (-64.414274687, -108.446507992))
            ThreePointArc((-64.414274687, -108.446507992), (-63.205357926, -105.527924753), (-60.286774687, -104.319007992))
            Line((-60.286774687, -104.319007992), (-68.957678907, -95.65730123))
            Line((-68.957678907, -95.65730123), (-68.957678907, -69.267314754))
            Line((-68.957678907, -69.267314754), (-60.286774687, -60.605607992))
            ThreePointArc((-60.286774687, -60.605607992), (-63.205357926, -59.396691232), (-64.414274687, -56.478107992))
            Line((-64.414274687, -56.478107992), (-68.957678907, -61.016692903))
            Line((-68.957678907, -61.016692903), (-68.957678907, -33.549923081))
            Line((-68.957678907, -33.549923081), (-64.414274687, -38.088507992))
            ThreePointArc((-64.414274687, -38.088507992), (-63.205357926, -35.169924753), (-60.286774687, -33.961007992))
            Line((-60.286774687, -33.961007992), (-68.957678907, -25.29930123))
        make_face()
    extrude(amount=-BOSS_EXTRUDE6_DEPTH)


solid = Compound([cut_extrude3_piece_2.part, body_3_2_1.part])
